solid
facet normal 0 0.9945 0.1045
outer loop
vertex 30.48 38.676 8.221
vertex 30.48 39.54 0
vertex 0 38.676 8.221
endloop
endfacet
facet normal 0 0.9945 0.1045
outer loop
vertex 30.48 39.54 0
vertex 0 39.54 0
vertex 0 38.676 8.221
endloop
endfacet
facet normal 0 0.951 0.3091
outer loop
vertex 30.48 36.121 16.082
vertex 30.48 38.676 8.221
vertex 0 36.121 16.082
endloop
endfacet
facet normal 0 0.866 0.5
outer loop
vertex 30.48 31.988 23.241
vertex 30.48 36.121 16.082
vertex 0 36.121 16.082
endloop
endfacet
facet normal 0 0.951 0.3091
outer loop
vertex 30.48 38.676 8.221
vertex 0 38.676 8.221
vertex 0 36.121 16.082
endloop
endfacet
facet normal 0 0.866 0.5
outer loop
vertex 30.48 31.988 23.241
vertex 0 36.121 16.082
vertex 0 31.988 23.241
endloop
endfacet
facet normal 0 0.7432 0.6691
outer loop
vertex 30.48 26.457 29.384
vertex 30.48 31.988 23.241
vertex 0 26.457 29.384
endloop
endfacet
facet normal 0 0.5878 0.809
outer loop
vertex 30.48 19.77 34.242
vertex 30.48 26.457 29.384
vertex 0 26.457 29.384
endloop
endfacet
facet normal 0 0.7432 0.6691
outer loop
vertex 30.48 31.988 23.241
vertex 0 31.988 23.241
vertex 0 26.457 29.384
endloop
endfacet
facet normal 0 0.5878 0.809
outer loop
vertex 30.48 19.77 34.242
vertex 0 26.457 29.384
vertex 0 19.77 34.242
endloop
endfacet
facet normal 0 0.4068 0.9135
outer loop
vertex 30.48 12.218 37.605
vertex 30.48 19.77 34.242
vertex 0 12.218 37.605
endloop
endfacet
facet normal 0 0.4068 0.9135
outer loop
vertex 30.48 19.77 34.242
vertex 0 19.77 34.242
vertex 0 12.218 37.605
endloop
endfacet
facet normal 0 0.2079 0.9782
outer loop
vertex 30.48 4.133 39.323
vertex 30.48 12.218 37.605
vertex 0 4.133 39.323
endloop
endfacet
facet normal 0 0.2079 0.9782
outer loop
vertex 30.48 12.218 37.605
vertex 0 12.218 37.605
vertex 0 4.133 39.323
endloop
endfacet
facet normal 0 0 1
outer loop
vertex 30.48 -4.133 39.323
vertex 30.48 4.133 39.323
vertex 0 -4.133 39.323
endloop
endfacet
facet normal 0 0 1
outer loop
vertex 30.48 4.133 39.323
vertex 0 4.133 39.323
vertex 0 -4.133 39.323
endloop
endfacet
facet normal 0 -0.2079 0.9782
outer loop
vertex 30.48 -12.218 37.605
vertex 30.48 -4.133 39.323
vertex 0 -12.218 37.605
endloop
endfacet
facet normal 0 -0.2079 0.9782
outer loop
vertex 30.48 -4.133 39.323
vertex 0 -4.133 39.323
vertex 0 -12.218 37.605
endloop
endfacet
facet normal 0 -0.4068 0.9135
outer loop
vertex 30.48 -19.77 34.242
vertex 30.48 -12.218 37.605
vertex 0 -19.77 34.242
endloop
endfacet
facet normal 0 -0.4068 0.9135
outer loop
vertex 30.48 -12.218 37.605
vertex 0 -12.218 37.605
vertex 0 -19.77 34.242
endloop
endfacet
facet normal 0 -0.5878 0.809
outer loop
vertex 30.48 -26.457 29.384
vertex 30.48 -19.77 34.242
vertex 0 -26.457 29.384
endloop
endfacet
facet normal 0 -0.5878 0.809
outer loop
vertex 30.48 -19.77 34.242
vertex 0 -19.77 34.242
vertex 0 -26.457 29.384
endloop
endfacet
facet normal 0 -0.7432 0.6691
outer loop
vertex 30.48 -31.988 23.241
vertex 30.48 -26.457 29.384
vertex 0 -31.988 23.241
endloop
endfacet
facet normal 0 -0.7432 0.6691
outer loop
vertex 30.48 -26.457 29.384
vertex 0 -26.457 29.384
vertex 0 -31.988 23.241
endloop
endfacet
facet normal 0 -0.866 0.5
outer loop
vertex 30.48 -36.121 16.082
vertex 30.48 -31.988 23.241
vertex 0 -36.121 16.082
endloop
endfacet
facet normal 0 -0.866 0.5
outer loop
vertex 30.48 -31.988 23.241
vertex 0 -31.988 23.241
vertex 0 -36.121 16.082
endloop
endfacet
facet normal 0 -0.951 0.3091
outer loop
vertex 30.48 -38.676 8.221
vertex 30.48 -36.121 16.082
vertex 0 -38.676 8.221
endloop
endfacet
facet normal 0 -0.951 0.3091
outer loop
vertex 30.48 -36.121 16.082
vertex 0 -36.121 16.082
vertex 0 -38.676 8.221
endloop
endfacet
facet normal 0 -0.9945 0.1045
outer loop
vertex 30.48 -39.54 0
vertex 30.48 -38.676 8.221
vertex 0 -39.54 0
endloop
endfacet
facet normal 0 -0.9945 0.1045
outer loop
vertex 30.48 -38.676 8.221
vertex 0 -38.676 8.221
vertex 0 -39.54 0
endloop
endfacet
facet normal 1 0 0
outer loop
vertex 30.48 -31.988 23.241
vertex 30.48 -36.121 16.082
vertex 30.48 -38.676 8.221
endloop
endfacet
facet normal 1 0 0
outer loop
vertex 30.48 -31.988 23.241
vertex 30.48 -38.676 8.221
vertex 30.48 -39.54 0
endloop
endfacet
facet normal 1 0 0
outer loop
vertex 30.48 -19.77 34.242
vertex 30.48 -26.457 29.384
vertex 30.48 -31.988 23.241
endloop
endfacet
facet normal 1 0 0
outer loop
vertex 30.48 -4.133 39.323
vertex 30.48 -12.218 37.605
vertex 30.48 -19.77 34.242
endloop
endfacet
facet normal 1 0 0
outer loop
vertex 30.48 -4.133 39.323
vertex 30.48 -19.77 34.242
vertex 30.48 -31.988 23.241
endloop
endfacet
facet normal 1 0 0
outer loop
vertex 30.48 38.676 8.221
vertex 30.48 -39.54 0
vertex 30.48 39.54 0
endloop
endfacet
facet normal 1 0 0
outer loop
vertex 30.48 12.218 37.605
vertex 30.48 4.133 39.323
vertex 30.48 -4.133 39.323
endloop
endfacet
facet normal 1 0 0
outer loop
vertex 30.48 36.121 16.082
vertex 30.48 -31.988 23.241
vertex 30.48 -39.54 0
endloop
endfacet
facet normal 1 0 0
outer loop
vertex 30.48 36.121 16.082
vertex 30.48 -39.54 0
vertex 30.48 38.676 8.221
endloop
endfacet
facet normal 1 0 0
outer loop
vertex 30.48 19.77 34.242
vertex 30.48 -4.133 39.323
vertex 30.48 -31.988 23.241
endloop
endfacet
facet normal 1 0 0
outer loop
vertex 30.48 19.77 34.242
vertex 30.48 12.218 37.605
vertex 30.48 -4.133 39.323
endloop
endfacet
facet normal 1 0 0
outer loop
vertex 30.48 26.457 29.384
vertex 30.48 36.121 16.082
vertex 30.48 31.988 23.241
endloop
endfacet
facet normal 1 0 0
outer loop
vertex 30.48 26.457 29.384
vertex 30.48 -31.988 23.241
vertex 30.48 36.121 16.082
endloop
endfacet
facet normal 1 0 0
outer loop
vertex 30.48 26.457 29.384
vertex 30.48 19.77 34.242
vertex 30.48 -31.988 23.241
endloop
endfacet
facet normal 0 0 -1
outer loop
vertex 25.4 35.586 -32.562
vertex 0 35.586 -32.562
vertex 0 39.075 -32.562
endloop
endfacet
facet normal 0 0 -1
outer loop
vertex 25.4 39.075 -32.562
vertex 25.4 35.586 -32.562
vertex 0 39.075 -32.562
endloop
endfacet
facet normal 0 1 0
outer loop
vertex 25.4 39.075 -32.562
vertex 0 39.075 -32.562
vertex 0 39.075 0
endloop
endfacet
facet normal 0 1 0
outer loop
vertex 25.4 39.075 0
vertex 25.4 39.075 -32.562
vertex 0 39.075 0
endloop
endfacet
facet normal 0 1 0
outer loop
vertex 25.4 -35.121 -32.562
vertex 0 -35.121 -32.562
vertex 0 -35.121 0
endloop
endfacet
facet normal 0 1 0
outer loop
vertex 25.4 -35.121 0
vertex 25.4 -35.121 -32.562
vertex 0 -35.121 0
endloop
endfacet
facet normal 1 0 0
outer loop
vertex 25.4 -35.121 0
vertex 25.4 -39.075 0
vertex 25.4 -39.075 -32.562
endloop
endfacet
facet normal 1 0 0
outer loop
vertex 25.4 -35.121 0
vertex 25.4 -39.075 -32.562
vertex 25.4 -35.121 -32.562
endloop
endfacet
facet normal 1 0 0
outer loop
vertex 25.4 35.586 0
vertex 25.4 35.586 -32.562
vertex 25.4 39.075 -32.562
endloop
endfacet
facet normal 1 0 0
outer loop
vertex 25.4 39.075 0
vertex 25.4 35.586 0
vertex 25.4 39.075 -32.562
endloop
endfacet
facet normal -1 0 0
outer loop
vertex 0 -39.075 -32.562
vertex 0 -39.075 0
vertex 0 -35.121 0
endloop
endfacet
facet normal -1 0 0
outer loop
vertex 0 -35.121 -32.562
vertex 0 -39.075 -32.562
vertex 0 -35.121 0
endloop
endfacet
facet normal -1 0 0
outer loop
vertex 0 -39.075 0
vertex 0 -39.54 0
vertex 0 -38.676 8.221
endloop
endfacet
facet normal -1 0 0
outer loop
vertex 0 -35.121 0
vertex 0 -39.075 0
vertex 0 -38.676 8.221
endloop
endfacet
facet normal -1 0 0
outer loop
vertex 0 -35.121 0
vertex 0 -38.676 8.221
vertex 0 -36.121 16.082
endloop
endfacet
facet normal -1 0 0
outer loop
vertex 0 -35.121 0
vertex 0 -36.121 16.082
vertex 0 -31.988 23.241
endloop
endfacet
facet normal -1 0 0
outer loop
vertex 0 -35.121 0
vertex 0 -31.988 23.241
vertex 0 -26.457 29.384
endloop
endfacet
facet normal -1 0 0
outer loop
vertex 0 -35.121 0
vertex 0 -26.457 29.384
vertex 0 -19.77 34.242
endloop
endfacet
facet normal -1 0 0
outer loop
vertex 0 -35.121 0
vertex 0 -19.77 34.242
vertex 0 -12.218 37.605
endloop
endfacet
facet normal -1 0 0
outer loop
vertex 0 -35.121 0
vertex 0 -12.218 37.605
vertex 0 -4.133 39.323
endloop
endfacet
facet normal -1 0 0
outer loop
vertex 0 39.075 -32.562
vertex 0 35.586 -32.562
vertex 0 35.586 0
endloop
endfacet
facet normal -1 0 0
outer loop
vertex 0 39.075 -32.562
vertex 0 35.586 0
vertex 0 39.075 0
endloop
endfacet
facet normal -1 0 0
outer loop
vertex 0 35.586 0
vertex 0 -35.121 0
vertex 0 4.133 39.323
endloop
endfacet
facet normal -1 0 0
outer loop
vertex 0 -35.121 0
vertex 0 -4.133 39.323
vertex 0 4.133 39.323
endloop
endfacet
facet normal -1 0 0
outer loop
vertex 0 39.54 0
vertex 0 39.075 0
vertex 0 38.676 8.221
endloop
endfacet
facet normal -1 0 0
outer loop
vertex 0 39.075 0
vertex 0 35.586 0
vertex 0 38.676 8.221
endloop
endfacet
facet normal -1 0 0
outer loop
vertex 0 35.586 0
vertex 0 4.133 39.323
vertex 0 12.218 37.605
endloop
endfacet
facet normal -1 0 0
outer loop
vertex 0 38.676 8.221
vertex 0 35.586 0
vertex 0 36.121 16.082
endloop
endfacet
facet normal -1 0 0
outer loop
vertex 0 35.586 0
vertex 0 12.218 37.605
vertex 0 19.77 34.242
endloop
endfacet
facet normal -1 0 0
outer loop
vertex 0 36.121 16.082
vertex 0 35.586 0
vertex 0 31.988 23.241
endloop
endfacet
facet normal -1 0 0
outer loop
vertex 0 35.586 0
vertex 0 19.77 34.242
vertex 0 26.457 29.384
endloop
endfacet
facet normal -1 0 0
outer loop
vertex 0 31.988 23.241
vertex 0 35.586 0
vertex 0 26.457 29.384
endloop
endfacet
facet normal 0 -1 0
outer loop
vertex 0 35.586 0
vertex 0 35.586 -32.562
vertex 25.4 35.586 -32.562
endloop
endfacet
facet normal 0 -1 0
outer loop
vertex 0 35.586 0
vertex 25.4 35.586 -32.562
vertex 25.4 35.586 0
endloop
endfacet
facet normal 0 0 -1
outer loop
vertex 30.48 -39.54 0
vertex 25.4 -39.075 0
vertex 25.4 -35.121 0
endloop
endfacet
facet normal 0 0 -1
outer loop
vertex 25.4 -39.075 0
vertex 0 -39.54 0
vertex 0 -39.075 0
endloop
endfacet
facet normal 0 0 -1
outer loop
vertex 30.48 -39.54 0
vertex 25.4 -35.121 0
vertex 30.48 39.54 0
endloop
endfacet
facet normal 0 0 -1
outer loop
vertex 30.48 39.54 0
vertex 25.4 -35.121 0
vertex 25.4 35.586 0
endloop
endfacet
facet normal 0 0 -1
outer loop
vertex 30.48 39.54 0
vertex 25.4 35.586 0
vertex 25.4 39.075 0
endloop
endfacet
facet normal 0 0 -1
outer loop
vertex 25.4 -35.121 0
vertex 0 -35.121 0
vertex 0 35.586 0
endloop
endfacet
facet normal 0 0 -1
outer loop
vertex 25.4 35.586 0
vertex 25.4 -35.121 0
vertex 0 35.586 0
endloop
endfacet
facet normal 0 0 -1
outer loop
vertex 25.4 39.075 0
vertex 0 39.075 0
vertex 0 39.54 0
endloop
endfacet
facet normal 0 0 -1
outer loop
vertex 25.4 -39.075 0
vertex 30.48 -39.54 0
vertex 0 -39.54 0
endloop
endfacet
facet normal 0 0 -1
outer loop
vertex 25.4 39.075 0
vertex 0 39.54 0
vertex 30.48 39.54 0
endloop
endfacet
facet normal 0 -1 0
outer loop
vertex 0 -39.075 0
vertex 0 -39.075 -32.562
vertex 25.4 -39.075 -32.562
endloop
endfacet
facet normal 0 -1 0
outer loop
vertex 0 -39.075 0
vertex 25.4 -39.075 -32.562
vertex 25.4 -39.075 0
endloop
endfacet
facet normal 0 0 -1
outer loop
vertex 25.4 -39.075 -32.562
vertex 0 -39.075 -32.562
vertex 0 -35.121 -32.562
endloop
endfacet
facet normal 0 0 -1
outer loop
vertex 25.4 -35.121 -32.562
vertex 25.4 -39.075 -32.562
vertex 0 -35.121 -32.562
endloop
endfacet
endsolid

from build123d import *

# Parameters (mm, degrees)
F1_DEPTH = 5.08
F2_DEPTH = 25.4
F3_W     = 3.4888088703
F3_H     = 32.5622074306
F3_W_2   = 3.9539821446
F4_DEPTH = 25.4


with BuildPart() as f1:
    # F0 (on Right) → F1 (new body)
    with BuildSketch(Plane.YZ):
        with BuildLine():
            Line((-39.5398288965, 0), (39.5398288965, 0))
            ThreePointArc((39.5398288965, 0), (0, 39.5398288965), (-39.5398288965, 0))
        make_face()
    extrude(amount=F1_DEPTH)

    # F2 (add): a face of the model
    f2_faces = [f1.faces().sort_by_distance(p)[0] for p in [
        (5.08, 0, 16.781224581),
    ]]
    extrude(f2_faces, amount=F2_DEPTH)

    # F3 (on Right) → F4 (join)
    with BuildSketch(Plane.YZ):
        with Locations((37.3302474618, -16.2811037153)):
            Rectangle(F3_W, F3_H)
        with Locations((-37.0976608247, -16.2811037153)):
            Rectangle(F3_W_2, F3_H)
    extrude(amount=F4_DEPTH)


solid = f1.part
